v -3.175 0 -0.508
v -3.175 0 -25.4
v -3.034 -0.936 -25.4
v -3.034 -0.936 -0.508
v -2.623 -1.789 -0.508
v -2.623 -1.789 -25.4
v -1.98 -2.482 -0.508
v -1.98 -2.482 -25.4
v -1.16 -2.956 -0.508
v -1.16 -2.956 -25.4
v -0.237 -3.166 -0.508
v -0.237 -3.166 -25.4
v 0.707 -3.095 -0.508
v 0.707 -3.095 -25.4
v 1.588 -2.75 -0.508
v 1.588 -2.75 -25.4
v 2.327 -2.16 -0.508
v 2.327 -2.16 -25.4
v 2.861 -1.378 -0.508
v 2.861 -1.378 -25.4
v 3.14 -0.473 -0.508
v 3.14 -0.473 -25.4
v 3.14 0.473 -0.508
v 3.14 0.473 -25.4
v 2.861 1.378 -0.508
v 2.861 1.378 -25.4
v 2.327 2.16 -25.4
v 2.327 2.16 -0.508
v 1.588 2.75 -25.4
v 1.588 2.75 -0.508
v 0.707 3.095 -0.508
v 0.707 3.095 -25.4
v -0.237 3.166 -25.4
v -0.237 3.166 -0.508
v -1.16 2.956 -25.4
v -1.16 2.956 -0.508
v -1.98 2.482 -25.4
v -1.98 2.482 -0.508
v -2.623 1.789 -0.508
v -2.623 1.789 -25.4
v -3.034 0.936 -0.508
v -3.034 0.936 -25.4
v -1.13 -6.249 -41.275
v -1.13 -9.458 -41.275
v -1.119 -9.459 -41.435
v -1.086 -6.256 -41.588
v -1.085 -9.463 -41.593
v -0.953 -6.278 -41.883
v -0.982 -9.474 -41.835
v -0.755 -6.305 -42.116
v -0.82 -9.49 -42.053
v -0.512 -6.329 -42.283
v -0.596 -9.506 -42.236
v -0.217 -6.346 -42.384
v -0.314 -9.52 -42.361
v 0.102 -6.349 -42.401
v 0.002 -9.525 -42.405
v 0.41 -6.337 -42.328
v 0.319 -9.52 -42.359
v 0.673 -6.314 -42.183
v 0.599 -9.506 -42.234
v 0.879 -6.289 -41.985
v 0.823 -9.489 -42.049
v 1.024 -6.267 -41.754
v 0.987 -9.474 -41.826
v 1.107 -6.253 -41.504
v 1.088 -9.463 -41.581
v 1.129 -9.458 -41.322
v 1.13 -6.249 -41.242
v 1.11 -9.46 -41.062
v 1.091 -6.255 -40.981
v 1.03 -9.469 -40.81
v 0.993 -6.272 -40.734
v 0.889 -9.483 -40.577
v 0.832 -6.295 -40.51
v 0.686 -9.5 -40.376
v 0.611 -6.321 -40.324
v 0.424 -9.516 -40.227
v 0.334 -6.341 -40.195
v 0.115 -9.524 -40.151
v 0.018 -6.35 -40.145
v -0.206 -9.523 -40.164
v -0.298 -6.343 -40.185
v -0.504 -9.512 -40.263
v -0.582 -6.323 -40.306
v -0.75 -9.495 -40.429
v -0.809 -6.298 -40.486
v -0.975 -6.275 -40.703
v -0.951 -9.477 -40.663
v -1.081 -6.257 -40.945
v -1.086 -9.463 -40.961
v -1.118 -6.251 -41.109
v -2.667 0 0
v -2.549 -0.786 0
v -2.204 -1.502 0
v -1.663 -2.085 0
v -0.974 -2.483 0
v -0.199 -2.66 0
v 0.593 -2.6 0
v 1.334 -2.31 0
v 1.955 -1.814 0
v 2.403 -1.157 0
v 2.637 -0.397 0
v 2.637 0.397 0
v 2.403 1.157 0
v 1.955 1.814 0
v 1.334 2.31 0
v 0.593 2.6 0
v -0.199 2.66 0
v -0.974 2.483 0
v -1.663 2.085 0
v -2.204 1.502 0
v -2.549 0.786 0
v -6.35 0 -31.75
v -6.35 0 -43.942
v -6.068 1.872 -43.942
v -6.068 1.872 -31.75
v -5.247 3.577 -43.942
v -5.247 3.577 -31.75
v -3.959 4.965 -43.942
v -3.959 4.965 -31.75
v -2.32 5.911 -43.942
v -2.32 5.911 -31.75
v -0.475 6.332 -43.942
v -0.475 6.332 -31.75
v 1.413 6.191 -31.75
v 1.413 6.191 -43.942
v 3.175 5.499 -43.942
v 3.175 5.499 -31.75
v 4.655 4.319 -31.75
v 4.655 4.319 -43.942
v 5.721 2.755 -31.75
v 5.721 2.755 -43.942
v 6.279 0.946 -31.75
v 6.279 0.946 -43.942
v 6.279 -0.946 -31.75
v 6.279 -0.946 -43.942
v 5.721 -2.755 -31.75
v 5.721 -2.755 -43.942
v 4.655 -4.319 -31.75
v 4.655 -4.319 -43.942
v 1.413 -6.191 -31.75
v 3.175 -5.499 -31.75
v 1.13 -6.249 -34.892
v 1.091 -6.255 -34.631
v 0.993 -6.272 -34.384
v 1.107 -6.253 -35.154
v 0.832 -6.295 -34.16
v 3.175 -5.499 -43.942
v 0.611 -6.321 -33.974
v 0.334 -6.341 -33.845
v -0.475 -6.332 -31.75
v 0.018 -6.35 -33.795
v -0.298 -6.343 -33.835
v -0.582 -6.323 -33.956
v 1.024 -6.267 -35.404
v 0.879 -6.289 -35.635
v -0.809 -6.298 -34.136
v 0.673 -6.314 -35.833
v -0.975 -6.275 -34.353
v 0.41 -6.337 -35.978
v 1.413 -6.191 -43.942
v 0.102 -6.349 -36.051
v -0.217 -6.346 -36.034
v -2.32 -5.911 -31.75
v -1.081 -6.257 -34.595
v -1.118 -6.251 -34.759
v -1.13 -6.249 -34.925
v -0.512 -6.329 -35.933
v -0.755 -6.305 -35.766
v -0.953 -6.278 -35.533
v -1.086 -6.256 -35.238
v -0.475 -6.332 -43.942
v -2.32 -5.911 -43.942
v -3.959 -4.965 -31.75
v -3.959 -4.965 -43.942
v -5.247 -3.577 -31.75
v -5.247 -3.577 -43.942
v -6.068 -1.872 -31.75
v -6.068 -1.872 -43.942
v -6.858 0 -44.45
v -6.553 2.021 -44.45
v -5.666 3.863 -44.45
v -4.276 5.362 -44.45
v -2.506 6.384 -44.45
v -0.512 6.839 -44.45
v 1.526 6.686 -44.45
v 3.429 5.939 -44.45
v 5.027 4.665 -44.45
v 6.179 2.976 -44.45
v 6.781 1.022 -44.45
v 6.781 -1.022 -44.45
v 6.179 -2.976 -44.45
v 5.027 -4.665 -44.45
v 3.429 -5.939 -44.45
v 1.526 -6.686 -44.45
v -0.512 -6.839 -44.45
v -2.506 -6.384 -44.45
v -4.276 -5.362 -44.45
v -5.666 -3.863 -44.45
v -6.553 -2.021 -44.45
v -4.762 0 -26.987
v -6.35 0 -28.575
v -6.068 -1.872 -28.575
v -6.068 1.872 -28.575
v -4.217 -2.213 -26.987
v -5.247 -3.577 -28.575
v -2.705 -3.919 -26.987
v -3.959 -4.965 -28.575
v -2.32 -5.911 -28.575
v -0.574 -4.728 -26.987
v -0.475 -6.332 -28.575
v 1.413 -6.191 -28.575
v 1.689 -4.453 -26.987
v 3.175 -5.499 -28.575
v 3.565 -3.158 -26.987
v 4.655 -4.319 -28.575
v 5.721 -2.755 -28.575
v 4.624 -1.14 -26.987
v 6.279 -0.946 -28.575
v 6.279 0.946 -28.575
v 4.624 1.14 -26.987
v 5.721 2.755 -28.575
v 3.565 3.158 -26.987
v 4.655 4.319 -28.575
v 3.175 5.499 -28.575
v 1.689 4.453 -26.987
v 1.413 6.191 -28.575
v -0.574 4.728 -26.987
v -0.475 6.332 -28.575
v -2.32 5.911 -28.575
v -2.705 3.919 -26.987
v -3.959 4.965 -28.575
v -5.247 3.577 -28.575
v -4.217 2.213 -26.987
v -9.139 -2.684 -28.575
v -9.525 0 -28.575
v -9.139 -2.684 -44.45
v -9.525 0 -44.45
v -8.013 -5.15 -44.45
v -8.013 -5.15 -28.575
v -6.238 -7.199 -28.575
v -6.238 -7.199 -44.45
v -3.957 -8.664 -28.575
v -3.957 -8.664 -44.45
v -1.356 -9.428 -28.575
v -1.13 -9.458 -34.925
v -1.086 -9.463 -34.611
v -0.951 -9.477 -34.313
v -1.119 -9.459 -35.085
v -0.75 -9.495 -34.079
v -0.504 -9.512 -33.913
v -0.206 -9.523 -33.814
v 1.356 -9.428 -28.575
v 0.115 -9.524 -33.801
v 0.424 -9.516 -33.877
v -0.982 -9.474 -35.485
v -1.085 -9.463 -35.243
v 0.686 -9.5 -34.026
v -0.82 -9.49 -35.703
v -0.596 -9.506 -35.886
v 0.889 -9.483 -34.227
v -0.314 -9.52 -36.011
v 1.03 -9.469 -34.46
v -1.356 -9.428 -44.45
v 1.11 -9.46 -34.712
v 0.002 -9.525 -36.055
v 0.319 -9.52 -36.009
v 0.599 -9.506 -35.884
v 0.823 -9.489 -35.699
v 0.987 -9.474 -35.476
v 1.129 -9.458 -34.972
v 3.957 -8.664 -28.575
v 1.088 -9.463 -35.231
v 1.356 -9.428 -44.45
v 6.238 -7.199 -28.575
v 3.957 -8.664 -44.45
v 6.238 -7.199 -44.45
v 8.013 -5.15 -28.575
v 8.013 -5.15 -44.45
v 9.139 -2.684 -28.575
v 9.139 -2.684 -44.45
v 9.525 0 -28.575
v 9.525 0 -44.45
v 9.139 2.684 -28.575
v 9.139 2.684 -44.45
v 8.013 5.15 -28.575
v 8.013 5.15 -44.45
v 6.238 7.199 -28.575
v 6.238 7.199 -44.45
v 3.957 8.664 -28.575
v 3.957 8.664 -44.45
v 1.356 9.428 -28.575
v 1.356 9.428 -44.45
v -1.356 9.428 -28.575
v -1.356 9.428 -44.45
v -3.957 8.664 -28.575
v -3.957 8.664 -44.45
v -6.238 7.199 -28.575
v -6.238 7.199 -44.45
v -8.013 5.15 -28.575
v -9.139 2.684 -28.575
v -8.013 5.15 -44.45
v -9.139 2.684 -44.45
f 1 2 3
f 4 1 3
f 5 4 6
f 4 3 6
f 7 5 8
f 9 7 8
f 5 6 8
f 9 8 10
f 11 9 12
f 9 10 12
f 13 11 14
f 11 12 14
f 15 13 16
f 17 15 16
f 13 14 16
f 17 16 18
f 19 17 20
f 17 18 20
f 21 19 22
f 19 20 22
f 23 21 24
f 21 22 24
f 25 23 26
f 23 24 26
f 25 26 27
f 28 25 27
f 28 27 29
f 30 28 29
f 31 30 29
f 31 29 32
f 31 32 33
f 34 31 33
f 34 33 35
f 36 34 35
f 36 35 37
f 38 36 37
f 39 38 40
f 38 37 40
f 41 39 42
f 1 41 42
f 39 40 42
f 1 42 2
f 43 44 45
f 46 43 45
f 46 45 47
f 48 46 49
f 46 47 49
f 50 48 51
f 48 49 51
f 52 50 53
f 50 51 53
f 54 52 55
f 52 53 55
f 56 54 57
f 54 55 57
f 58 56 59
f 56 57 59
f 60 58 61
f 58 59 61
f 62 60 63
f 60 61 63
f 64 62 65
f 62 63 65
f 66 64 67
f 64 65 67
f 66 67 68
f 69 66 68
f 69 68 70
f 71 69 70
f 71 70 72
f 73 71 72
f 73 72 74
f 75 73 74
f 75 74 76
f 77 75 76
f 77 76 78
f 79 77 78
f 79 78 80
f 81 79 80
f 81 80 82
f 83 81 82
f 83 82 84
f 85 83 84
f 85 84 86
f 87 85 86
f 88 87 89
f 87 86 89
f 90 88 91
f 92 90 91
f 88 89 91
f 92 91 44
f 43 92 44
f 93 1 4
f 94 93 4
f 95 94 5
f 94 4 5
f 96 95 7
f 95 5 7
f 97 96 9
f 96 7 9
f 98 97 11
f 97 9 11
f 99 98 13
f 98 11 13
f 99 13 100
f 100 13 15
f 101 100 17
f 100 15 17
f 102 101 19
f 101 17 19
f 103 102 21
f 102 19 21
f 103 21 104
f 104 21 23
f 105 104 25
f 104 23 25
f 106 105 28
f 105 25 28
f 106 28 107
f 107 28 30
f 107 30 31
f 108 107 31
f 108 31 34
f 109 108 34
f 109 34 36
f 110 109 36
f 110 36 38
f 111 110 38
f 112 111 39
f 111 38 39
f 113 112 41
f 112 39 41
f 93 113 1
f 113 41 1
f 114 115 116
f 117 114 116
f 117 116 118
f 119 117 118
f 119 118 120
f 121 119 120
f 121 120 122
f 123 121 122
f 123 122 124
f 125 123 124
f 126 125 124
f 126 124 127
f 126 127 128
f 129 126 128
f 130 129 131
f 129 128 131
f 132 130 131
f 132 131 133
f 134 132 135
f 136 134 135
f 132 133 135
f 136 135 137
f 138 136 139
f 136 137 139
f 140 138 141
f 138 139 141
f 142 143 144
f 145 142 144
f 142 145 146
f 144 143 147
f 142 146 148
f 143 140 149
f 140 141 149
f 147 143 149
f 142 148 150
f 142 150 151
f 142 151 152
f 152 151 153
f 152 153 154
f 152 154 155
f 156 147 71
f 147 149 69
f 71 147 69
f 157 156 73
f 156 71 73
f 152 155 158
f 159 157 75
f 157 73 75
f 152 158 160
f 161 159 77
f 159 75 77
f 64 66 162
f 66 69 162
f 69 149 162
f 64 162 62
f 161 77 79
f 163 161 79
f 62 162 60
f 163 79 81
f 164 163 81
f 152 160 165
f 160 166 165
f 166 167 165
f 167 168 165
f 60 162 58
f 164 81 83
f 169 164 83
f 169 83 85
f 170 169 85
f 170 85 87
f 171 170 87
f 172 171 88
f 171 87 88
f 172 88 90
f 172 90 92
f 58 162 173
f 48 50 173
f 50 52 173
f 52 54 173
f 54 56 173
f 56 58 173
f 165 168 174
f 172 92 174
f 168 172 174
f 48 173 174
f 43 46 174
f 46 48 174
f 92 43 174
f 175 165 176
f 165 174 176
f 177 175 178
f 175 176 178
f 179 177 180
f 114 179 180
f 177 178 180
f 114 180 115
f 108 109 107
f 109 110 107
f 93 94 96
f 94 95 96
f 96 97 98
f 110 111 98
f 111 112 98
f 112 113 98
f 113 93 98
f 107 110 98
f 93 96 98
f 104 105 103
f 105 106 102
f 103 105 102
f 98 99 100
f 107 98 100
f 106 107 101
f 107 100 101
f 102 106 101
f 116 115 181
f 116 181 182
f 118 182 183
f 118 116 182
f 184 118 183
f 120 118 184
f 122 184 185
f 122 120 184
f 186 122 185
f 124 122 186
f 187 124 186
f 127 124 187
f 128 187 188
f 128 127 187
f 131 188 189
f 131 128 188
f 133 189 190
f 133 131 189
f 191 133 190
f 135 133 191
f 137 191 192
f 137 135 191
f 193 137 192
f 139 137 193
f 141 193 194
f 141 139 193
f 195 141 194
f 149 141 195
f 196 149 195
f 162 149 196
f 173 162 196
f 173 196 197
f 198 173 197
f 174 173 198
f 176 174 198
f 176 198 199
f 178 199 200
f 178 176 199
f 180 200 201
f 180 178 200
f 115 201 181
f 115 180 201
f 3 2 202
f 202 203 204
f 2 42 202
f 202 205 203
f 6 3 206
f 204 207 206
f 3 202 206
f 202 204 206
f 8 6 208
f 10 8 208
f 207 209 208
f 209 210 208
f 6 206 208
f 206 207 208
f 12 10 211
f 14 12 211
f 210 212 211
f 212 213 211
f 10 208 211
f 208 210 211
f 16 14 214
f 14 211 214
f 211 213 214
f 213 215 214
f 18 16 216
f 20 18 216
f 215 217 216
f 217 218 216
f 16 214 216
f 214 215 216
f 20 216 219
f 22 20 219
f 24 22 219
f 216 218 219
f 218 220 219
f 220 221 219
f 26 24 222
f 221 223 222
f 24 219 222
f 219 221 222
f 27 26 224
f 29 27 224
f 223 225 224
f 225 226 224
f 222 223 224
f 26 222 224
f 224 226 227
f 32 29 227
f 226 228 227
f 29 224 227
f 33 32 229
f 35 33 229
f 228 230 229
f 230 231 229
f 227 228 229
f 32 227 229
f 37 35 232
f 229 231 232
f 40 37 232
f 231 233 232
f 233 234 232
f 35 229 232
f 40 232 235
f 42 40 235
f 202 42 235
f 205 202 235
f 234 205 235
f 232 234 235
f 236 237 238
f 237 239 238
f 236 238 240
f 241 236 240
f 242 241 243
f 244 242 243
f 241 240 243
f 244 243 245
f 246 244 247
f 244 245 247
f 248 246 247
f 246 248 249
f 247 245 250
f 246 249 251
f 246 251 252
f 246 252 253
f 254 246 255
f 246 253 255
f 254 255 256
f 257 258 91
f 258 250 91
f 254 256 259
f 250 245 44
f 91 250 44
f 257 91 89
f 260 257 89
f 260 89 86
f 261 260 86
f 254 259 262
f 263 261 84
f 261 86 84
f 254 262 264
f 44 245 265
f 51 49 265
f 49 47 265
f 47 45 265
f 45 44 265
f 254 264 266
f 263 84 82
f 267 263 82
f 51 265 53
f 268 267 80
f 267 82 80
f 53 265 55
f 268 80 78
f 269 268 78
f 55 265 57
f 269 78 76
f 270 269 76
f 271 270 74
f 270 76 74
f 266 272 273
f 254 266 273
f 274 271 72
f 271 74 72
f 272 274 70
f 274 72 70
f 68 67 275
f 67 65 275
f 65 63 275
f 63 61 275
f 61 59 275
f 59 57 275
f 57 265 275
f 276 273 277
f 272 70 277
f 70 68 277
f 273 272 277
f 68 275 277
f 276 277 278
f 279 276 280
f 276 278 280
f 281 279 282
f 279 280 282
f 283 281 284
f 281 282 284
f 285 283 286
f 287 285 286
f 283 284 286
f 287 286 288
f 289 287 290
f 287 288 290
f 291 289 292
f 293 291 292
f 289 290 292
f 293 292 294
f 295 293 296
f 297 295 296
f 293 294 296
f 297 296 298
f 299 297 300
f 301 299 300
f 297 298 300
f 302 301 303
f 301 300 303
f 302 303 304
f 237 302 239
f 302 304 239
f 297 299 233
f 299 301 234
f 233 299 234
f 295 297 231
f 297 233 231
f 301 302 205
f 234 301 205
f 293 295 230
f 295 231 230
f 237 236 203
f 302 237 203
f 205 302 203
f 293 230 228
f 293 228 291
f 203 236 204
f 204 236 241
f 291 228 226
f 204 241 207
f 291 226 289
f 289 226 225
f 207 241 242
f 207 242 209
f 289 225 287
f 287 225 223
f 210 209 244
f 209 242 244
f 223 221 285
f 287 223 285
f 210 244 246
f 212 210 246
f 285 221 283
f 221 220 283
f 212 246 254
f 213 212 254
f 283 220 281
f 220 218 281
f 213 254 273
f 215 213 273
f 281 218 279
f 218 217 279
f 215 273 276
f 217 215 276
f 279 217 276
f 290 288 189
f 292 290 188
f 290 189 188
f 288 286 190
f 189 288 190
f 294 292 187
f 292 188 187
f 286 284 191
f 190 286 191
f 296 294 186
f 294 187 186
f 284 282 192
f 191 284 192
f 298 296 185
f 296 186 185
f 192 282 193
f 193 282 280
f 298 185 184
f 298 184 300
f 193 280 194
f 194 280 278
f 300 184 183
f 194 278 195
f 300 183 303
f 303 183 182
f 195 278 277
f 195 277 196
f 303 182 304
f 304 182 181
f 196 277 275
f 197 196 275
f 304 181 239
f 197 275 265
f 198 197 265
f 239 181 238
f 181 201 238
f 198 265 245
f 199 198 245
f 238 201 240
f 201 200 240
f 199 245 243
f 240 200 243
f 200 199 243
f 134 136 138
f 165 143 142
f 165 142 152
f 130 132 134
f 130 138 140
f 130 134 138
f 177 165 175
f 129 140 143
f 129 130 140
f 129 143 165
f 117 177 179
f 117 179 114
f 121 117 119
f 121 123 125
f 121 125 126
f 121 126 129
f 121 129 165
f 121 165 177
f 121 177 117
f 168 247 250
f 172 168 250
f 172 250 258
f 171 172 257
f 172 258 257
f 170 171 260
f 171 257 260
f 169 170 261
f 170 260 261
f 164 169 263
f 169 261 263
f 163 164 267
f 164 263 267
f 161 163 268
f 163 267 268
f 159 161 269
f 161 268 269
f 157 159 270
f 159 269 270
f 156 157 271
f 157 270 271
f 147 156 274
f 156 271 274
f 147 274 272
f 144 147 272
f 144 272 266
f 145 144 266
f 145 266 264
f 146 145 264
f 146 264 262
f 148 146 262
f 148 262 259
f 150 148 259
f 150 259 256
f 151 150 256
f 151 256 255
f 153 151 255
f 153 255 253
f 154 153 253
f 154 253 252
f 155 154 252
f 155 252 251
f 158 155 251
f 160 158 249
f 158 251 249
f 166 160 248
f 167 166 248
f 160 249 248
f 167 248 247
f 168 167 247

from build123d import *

# Parameters (mm, degrees)
SKETCH4_R                  = 6.35
SHAFT_BORE_DEPTH           = 12.7
F_4_40_TAPPED_HOLE1_REACH  = 51.289
F_4_40_TAPPED_HOLE1_BORE_R = 1.1303
CHAMFER1_SIZE              = 0.508
CHAMFER2_SIZE              = 3.175
CHAMFER3_SIZE              = 0.508


with BuildPart() as part:
    # Sketch → Shaft (revolve)
    with BuildSketch(Plane(origin=(0, 0, 0), x_dir=(0, 0, -1), z_dir=(1, 0, 0)), mode=Mode.PRIVATE) as shaft_sk:
        Polygon((0, 0), (0, 3.175), (28.575, 3.175), (28.575, 9.525), (44.45, 9.525), (44.45, 0), align=None)
    revolve(shaft_sk.sketch.rotate(Axis((0, 0, -44.45), (0, 0, 1)), 90), axis=Axis((0, 0, -44.45), (0, 0, 1)))

    # Sketch4 → Shaft Bore (cut)
    with BuildSketch(Plane(origin=(0, 0, -44.45), x_dir=(-1, 0, 0), z_dir=(0, 0, -1))):
        Circle(SKETCH4_R)
    extrude(amount=-SHAFT_BORE_DEPTH, mode=Mode.SUBTRACT)

    # #4-40 Tapped Hole1 bore → #4-40 Tapped Hole1 (cut, up to next)
    with BuildSketch(Plane(origin=(0, -9.525, 0), x_dir=(-1, 0, 0), z_dir=(0, -1, 0)), mode=Mode.PRIVATE) as f_4_40_tapped_hole1_sk1:
        with Locations((0, 34.925)):
            Circle(F_4_40_TAPPED_HOLE1_BORE_R)
    f_4_40_tapped_hole1_tool1 = extrude(f_4_40_tapped_hole1_sk1.sketch, amount=-F_4_40_TAPPED_HOLE1_REACH, mode=Mode.PRIVATE) & part.part
    # #4-40 Tapped Hole1 bore → #4-40 Tapped Hole1 (cut, up to next)
    with BuildSketch(Plane(origin=(0, -9.525, 0), x_dir=(-1, 0, 0), z_dir=(0, -1, 0)), mode=Mode.PRIVATE) as f_4_40_tapped_hole1_sk2:
        with Locations((0, 41.275)):
            Circle(F_4_40_TAPPED_HOLE1_BORE_R)
    f_4_40_tapped_hole1_tool2 = extrude(f_4_40_tapped_hole1_sk2.sketch, amount=-F_4_40_TAPPED_HOLE1_REACH, mode=Mode.PRIVATE) & part.part
    add(f_4_40_tapped_hole1_tool1.solids().sort_by_distance((0, -9.525, -34.925))[0], mode=Mode.SUBTRACT)
    add(f_4_40_tapped_hole1_tool2.solids().sort_by_distance((0, -9.525, -41.275))[0], mode=Mode.SUBTRACT)

    # Chamfer1
    chamfer1_edges = [part.edges().sort_by_distance(p)[0] for p in [
        (3.175, 0, 0),
    ]]
    chamfer(chamfer1_edges, length=CHAMFER1_SIZE)

    # Chamfer2
    chamfer2_edges = [part.edges().sort_by_distance(p)[0] for p in [
        (3.175, 0, -28.575),
    ]]
    chamfer(chamfer2_edges, length=CHAMFER2_SIZE)

    # Chamfer3
    chamfer3_edges = [part.edges().sort_by_distance(p)[0] for p in [
        (6.35, 0, -44.45),
    ]]
    chamfer(chamfer3_edges, length=CHAMFER3_SIZE)


solid = part.part
